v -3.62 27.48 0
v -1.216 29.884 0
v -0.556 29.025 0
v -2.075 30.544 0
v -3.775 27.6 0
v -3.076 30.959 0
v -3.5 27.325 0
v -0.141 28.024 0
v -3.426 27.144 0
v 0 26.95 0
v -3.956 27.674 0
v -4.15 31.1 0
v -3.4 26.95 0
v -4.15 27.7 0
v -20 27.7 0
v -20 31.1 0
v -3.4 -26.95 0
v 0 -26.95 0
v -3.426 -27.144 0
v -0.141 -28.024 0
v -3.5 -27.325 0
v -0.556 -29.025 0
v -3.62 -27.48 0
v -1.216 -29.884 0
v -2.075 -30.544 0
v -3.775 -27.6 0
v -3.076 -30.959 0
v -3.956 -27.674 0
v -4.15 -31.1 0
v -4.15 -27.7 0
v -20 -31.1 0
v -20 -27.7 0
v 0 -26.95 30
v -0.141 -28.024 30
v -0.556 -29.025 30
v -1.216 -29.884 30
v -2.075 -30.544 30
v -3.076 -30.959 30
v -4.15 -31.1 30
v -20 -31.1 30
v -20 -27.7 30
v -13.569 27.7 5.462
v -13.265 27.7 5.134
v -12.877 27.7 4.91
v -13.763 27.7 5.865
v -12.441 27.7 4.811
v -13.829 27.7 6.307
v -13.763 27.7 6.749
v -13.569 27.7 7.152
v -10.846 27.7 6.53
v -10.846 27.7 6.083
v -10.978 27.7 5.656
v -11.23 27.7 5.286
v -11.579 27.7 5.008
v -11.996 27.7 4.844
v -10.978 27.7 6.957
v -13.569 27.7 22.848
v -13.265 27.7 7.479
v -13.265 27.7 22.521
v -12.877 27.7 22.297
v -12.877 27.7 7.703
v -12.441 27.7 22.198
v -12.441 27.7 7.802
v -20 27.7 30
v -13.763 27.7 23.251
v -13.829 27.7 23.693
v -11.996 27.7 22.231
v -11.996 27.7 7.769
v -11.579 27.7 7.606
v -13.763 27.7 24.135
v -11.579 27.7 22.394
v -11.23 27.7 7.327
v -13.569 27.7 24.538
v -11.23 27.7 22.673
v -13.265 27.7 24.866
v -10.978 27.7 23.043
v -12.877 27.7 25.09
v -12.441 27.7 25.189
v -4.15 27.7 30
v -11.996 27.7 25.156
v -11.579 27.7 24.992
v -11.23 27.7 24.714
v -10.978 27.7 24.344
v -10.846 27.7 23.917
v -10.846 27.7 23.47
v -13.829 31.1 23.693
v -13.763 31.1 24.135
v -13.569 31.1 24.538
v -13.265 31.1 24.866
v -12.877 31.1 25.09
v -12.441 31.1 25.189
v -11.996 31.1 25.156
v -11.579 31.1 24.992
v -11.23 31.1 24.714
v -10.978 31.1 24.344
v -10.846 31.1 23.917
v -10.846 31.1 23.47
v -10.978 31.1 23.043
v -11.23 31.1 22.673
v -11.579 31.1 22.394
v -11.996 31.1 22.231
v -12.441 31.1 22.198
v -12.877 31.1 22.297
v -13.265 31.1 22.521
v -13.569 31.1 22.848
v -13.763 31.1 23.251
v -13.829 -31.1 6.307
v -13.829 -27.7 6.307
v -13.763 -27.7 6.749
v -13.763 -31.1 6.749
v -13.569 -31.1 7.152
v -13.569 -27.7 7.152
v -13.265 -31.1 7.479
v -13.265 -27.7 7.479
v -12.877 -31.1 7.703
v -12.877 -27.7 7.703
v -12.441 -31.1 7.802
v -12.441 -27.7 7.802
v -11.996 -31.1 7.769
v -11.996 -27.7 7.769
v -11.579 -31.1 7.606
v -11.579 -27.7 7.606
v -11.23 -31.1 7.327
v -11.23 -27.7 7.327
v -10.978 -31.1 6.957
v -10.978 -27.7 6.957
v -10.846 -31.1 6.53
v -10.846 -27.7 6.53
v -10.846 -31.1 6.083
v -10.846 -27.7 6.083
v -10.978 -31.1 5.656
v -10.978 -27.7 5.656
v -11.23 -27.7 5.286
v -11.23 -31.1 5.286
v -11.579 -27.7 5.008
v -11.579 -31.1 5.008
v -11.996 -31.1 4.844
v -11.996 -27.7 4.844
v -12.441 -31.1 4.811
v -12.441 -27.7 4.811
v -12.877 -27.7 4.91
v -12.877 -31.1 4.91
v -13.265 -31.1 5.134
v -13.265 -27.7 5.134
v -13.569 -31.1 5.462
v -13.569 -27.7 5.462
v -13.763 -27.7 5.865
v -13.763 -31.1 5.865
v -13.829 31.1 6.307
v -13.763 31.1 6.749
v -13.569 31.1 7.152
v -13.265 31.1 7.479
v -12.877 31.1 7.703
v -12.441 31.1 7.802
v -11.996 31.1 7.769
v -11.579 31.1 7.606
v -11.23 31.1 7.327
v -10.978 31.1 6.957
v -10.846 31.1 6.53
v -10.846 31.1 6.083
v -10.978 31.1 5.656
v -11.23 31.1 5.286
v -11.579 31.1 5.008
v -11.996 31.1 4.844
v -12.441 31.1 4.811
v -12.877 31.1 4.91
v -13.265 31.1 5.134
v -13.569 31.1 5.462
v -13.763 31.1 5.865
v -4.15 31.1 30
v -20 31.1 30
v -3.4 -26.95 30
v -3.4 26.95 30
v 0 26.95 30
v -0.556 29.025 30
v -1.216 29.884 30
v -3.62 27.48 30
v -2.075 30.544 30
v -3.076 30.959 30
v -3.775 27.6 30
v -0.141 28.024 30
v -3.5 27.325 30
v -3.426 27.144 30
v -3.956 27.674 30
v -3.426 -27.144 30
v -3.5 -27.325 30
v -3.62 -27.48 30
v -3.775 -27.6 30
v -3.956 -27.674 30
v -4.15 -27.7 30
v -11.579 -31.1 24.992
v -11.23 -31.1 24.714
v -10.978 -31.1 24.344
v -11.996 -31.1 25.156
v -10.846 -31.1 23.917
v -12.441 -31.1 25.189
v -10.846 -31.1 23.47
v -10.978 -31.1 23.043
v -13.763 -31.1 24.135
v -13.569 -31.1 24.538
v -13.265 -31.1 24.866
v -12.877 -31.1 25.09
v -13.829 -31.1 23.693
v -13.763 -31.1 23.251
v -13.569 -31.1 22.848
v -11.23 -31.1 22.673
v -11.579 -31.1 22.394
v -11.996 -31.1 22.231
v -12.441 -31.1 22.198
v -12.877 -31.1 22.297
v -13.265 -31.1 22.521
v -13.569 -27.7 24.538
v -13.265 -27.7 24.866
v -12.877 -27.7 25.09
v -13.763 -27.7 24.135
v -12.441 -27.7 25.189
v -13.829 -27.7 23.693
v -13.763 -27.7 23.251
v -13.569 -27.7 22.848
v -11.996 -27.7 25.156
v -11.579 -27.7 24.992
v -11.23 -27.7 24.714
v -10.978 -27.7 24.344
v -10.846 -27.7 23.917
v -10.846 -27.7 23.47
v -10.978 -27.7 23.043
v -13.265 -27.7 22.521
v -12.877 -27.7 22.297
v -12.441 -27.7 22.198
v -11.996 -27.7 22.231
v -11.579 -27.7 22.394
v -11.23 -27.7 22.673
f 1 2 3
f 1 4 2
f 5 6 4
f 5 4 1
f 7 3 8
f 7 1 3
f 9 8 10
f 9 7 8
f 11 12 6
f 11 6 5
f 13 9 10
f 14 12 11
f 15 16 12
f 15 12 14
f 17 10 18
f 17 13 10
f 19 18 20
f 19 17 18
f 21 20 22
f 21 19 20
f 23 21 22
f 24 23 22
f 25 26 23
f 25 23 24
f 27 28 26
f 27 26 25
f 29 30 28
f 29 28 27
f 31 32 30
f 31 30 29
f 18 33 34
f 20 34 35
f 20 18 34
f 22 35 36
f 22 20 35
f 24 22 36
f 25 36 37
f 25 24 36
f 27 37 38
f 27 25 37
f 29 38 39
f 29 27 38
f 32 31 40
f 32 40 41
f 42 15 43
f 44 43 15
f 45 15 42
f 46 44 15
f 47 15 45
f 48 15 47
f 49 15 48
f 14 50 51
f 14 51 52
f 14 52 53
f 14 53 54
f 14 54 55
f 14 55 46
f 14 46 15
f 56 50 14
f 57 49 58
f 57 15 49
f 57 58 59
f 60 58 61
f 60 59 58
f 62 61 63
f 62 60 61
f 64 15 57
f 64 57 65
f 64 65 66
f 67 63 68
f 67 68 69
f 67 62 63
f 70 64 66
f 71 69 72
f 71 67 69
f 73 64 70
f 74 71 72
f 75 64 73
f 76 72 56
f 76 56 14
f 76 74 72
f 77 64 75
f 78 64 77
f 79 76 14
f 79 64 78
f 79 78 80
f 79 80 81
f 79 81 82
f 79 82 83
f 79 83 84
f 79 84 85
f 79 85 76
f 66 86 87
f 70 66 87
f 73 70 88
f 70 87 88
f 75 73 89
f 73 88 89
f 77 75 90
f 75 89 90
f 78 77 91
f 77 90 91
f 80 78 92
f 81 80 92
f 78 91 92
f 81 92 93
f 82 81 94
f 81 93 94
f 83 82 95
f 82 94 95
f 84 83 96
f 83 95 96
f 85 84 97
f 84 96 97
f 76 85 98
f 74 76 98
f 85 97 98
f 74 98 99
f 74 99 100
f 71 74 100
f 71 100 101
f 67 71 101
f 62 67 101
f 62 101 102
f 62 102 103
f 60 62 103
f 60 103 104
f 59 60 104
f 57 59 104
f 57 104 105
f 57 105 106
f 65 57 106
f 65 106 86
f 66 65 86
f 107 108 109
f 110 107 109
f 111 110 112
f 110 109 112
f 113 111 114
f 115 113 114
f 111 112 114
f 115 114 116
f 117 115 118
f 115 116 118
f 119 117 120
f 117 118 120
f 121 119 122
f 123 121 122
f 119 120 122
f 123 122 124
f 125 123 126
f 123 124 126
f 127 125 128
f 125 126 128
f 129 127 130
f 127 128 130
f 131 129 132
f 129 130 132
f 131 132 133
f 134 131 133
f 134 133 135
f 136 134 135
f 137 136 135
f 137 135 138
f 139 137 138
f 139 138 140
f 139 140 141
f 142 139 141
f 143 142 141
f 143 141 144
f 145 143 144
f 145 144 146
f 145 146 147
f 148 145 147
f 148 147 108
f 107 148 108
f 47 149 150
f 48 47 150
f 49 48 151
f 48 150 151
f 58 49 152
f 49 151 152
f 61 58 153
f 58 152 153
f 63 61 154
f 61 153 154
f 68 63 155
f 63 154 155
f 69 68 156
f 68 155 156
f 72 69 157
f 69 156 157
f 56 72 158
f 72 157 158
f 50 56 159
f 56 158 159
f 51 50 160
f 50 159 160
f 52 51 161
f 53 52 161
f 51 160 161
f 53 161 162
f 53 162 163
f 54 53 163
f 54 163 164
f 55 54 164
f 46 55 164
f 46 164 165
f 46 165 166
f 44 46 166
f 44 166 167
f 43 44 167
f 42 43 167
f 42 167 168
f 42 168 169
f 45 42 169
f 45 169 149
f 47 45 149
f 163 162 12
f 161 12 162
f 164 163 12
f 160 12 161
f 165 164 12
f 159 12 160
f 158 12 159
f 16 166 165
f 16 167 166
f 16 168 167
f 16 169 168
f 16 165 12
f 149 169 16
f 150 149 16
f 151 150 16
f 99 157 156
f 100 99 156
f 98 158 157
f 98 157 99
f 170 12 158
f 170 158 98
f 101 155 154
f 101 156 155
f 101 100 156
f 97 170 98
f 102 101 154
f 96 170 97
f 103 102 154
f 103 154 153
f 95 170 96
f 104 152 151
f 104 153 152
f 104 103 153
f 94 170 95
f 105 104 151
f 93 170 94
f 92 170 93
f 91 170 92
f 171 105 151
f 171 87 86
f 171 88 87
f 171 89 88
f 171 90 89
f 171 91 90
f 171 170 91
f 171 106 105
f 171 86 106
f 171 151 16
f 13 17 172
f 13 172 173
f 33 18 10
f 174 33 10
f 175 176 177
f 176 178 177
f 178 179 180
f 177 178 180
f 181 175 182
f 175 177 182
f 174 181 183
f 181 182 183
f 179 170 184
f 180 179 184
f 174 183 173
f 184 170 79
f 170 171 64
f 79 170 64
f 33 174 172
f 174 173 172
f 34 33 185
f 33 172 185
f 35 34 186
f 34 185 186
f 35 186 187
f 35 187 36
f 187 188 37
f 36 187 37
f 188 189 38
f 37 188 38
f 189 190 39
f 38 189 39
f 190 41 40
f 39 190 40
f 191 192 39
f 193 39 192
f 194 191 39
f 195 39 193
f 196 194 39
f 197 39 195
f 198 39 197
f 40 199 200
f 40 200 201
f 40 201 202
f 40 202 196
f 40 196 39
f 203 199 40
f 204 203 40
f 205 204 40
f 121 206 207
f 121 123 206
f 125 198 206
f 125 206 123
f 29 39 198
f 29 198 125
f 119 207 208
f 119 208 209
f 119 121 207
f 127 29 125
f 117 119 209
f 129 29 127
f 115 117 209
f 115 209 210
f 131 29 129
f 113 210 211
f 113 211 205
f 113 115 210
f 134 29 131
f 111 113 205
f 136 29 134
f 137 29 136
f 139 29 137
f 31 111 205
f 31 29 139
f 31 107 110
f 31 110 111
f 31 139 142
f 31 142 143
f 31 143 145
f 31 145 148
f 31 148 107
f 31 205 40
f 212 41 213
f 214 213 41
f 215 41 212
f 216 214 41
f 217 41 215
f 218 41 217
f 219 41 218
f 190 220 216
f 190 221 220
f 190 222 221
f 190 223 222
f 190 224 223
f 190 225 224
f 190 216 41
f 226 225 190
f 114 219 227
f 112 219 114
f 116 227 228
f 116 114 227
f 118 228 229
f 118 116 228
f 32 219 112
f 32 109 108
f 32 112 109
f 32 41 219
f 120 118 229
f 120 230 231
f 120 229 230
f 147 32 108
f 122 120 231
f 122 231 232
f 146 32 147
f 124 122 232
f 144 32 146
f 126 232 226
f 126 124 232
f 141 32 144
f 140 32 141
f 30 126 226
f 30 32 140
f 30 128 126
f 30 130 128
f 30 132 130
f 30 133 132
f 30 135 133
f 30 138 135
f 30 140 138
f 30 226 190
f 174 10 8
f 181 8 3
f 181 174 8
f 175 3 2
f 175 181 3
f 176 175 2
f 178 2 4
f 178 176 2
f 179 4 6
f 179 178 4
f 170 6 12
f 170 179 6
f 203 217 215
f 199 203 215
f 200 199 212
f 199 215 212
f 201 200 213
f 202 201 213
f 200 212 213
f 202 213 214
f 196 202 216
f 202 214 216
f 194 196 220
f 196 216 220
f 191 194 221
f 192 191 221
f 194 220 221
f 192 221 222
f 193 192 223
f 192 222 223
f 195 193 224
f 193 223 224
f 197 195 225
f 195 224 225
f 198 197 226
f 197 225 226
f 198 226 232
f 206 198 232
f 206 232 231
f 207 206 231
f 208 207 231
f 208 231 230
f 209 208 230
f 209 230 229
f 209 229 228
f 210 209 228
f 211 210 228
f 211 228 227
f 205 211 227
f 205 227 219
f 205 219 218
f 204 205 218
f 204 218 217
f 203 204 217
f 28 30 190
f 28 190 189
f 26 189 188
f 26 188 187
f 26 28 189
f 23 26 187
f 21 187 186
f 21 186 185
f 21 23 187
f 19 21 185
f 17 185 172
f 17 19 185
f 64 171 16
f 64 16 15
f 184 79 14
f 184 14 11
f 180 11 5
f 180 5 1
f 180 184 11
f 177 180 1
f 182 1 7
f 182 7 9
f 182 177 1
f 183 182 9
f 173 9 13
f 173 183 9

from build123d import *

# Parameters (mm, degrees)
SKETCH11_W                     = 3.4
SKETCH11_H                     = 62.2
BASE_FLANGE3_DEPTH             = 30
EDGE_FLANGE1_STRIP_W           = 15.1
EDGE_FLANGE1_STRIP_H           = 3.4
EDGE_FLANGE1_STRIP_CUT_DEPTH   = 30
EDGE_FLANGE1_STRIP_2_W         = 15.1
EDGE_FLANGE1_STRIP_2_H         = 3.4
EDGE_FLANGE1_STRIP_CUT_2_DEPTH = 30
EDGE_FLANGE1_DEPTH             = 30
EDGE_FLANGE1_BEND_DEPTH        = 30
SKETCH22_R                     = 1.5
CUT_EXTRUDE1_DEPTH             = 72.894645141


# Sheet-metal steps are written as plain solids
with BuildPart() as part:
    # Sketch11 → Base-Flange3 (new body)
    with BuildSketch(Plane.XY):
        with Locations((-1.7, 0)):
            Rectangle(SKETCH11_W, SKETCH11_H)
    extrude(amount=BASE_FLANGE3_DEPTH)

    # Edge-Flange1 strip (across the edge) → Edge-Flange1 strip cut (cut)
    with BuildSketch(Plane(origin=(-3.4, 31.1, 30), x_dir=(0, -1, 0), z_dir=(0, 0, -1))):
        with Locations((-3.4, -1.7)):
            Rectangle(EDGE_FLANGE1_STRIP_W, EDGE_FLANGE1_STRIP_H)
    extrude(amount=EDGE_FLANGE1_STRIP_CUT_DEPTH, mode=Mode.SUBTRACT)

    # Edge-Flange1 strip 2 (across the edge) → Edge-Flange1 strip cut 2 (cut)
    with BuildSketch(Plane(origin=(-3.4, -31.1, 0), x_dir=(0, 1, 0), z_dir=(0, 0, 1))):
        with Locations((-3.4, -1.7)):
            Rectangle(EDGE_FLANGE1_STRIP_2_W, EDGE_FLANGE1_STRIP_2_H)
    extrude(amount=EDGE_FLANGE1_STRIP_CUT_2_DEPTH, mode=Mode.SUBTRACT)

    # Edge-Flange1 section (across the edge) → Edge-Flange1 (add)
    with BuildSketch(Plane(origin=(-3.4, 31.1, 30), x_dir=(0, -1, 0), z_dir=(0, 0, -1))):
        with BuildLine():
            Line((0, 0.75), (0, 16.6))
            Line((0, 16.6), (3.4, 16.6))
            Line((3.4, 16.6), (3.4, 0.75))
            ThreePointArc((3.4, 0.75), (3.619669914, 0.219669914), (4.15, 0))
            Line((4.15, 0), (4.15, -3.4))
            ThreePointArc((4.15, -3.4), (1.215506858, -2.184493142), (0, 0.75))
        make_face()
    extrude(amount=EDGE_FLANGE1_DEPTH)

    # Edge-Flange1 section 2 (across the edge) → Edge-Flange1 bend (add)
    with BuildSketch(Plane(origin=(-3.4, -31.1, 0), x_dir=(0, 1, 0), z_dir=(0, 0, 1))):
        with BuildLine():
            Line((0, 0.75), (0, 16.6))
            Line((0, 16.6), (3.4, 16.6))
            Line((3.4, 16.6), (3.4, 0.75))
            ThreePointArc((3.4, 0.75), (3.619669914, 0.219669914), (4.15, 0))
            Line((4.15, 0), (4.15, -3.4))
            ThreePointArc((4.15, -3.4), (1.215506858, -2.184493142), (0, 0.75))
        make_face()
    extrude(amount=EDGE_FLANGE1_BEND_DEPTH)

    # Sketch22 → Cut-Extrude1 (cut, through all)
    with BuildSketch(Plane(origin=(0, 31.1, 0), x_dir=(1, 0, 0), z_dir=(0, 1, 0))):
        with Locations(Location((-12.329371406, -23.693332437, 0), (0, 0, 180))):
            Circle(SKETCH22_R)
        with Locations(Location((-12.329371406, -6.306667563, 0), (0, 0, 180))):
            Circle(SKETCH22_R)
    extrude(amount=-CUT_EXTRUDE1_DEPTH, mode=Mode.SUBTRACT)


solid = part.part
